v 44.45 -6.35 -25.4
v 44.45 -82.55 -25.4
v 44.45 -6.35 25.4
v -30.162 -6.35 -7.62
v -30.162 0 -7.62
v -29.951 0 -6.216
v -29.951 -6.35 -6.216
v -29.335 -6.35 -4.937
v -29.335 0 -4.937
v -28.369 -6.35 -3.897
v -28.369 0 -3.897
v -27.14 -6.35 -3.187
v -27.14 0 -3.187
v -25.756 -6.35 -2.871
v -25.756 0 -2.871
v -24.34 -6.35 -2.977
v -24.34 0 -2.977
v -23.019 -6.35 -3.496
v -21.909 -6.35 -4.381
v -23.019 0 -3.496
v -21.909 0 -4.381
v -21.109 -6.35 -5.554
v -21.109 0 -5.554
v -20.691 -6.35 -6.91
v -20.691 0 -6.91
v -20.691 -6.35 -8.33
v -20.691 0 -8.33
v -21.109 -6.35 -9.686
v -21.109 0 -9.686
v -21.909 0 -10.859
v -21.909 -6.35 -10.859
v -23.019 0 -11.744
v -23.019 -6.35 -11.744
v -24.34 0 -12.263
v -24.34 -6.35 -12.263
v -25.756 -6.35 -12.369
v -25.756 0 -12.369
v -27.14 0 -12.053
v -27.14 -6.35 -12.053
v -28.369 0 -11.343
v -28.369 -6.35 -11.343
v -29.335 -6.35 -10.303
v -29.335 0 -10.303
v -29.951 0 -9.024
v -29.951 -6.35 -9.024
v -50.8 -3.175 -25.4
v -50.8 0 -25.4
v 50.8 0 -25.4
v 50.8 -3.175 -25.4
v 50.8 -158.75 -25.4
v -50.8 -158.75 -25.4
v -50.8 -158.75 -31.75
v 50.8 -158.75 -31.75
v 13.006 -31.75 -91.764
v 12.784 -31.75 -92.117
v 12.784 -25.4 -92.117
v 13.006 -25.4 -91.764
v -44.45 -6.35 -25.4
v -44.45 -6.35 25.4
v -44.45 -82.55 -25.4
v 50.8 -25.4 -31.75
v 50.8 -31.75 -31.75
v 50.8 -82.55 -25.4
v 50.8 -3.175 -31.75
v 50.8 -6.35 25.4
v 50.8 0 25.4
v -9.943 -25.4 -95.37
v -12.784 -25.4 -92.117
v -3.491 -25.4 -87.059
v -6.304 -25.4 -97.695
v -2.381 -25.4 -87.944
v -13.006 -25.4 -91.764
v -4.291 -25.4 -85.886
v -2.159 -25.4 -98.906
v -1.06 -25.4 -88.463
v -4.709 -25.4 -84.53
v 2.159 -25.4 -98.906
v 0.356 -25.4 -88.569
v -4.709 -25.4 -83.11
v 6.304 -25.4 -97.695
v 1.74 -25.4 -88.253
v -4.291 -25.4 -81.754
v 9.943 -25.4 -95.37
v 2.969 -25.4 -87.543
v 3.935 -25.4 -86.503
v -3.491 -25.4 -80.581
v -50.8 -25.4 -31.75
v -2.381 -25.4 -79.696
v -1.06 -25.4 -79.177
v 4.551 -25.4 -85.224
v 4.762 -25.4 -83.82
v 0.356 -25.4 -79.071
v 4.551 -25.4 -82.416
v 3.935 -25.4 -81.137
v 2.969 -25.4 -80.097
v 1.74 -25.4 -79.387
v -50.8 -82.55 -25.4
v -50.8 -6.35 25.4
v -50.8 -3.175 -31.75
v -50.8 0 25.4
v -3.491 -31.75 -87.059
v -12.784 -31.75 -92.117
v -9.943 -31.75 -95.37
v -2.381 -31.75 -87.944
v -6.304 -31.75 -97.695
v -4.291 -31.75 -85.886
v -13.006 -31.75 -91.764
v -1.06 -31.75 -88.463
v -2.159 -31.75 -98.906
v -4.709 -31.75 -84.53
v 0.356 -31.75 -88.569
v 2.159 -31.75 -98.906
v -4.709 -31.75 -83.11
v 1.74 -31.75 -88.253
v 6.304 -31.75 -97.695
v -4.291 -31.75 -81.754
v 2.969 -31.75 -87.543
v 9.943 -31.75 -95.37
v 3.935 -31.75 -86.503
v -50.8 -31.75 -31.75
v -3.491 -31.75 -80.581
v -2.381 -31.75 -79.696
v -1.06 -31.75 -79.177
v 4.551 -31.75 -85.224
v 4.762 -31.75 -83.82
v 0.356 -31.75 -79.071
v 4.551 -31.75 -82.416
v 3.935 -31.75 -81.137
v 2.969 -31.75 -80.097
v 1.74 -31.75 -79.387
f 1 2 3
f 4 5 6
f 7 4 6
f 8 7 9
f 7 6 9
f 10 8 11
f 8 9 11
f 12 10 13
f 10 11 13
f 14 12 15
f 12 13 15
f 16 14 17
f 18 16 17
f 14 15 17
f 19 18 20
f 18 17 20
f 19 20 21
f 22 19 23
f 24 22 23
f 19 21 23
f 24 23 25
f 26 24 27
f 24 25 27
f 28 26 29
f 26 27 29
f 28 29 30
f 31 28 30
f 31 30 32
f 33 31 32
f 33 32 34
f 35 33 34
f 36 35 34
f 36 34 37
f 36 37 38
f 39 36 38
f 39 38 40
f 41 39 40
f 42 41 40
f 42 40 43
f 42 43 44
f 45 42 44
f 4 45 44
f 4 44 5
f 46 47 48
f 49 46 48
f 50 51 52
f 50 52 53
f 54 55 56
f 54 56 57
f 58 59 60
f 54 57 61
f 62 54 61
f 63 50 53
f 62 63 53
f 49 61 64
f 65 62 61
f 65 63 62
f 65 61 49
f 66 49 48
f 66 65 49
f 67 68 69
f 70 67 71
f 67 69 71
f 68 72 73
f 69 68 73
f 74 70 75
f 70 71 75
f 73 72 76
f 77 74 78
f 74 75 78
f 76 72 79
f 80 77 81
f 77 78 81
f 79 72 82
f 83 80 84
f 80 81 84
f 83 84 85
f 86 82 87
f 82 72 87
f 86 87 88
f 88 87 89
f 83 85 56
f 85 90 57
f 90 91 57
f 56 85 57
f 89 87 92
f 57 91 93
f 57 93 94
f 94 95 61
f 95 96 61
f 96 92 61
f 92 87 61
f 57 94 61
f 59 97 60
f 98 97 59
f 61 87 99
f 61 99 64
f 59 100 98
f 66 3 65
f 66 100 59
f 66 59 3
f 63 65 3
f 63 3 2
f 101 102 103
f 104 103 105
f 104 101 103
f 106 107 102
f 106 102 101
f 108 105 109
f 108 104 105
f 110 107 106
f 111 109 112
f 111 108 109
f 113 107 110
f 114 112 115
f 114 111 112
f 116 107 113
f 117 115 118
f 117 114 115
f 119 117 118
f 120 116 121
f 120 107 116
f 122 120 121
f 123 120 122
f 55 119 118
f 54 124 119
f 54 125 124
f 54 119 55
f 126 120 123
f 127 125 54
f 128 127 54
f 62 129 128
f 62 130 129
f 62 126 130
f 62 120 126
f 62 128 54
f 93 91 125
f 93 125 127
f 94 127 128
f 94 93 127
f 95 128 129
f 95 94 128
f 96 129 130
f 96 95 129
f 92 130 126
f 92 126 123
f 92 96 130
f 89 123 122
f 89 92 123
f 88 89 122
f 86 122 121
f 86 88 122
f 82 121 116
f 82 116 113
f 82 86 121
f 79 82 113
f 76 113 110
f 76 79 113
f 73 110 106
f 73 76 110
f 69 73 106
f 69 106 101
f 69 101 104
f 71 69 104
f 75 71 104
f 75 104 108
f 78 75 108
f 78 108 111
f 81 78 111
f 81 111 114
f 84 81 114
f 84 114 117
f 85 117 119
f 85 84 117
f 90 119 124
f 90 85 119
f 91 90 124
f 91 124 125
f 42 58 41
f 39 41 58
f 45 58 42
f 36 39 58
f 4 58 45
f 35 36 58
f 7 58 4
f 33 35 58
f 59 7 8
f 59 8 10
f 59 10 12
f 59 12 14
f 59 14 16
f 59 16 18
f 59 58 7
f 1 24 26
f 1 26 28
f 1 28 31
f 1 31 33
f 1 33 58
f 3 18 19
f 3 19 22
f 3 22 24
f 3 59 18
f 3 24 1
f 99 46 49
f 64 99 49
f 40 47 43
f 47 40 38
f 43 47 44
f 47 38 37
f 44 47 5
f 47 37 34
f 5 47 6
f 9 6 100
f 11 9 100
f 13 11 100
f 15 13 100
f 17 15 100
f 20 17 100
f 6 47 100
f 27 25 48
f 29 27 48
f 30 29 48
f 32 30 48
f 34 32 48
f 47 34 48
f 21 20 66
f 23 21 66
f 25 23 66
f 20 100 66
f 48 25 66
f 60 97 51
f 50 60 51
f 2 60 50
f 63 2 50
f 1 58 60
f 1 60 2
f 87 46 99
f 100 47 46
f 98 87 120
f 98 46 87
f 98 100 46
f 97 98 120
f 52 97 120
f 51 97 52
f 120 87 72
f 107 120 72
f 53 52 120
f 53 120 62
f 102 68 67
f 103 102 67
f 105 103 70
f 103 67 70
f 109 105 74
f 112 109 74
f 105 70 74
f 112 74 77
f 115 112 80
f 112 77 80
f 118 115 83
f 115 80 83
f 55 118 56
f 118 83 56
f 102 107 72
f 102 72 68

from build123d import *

# Parameters (mm, degrees)
F0_W          = 101.6
F0_H          = 50.8
F1_DEPTH      = 6.35
F2_W          = 101.6
F2_H          = 6.35
F3_DEPTH      = 152.4
F3_DEPTH_BACK = 3.175
F8_R          = 4.7625
F9_DEPTH      = 6.35
F10_DEPTH     = 6.35
F11_DEPTH     = 6.35
F12_D         = 9.525


with BuildPart() as f1:
    # F0 (on Front) → F1 (new body)
    with BuildSketch(Plane.XZ):
        Rectangle(F0_W, F0_H)
    extrude(amount=F1_DEPTH)

    # F2 (on face) → F3 (join, two sides)
    with BuildSketch(Plane.XZ.offset(6.35)) as f3_sk:
        with Locations((0, -28.575)):
            Rectangle(F2_W, F2_H)
    extrude(amount=F3_DEPTH)
    extrude(f3_sk.sketch, amount=-F3_DEPTH_BACK)

    # F8 (on offset) → F9 (join)
    with BuildSketch(Plane.XZ.offset(25.4)):
        with BuildLine():
            Line((-50.8, -31.75), (-13.0057051322, -91.7641320492))
            Line((-13.0057051322, -91.7641320492), (-12.7835835223, -92.1168423107))
            ThreePointArc((-12.7835835223, -92.1168423107), (0, -99.06), (12.7835835223, -92.1168423107))
            Line((12.7835835223, -92.1168423107), (13.0057051322, -91.7641320492))
            Line((13.0057051322, -91.7641320492), (50.8, -31.75))
            Line((50.8, -31.75), (-50.8, -31.75))
        make_face()
        with Locations((0, -83.82)):
            Circle(F8_R, mode=Mode.SUBTRACT)
    extrude(amount=F9_DEPTH)

    # F5 (on face) → F10 (join)
    with BuildSketch(Plane(origin=(-50.8, 0, 0), x_dir=(0, -1, 0), z_dir=(-1, 0, 0))):
        Polygon((82.55, -25.4), (6.35, 25.4), (6.35, -25.4), align=None)
    extrude(amount=-F10_DEPTH)

    # F4 (on face) → F11 (join)
    with BuildSketch(Plane.YZ.offset(50.8)):
        Polygon((-82.55, -25.4), (-6.35, -25.4), (-6.35, 25.4), align=None)
    extrude(amount=-F11_DEPTH)

    # F12 (through all)
    with Locations(Plane.XZ.offset(6.35)):
        with Locations((-25.4, -7.62)):
            Hole(F12_D / 2)


solid = f1.part
